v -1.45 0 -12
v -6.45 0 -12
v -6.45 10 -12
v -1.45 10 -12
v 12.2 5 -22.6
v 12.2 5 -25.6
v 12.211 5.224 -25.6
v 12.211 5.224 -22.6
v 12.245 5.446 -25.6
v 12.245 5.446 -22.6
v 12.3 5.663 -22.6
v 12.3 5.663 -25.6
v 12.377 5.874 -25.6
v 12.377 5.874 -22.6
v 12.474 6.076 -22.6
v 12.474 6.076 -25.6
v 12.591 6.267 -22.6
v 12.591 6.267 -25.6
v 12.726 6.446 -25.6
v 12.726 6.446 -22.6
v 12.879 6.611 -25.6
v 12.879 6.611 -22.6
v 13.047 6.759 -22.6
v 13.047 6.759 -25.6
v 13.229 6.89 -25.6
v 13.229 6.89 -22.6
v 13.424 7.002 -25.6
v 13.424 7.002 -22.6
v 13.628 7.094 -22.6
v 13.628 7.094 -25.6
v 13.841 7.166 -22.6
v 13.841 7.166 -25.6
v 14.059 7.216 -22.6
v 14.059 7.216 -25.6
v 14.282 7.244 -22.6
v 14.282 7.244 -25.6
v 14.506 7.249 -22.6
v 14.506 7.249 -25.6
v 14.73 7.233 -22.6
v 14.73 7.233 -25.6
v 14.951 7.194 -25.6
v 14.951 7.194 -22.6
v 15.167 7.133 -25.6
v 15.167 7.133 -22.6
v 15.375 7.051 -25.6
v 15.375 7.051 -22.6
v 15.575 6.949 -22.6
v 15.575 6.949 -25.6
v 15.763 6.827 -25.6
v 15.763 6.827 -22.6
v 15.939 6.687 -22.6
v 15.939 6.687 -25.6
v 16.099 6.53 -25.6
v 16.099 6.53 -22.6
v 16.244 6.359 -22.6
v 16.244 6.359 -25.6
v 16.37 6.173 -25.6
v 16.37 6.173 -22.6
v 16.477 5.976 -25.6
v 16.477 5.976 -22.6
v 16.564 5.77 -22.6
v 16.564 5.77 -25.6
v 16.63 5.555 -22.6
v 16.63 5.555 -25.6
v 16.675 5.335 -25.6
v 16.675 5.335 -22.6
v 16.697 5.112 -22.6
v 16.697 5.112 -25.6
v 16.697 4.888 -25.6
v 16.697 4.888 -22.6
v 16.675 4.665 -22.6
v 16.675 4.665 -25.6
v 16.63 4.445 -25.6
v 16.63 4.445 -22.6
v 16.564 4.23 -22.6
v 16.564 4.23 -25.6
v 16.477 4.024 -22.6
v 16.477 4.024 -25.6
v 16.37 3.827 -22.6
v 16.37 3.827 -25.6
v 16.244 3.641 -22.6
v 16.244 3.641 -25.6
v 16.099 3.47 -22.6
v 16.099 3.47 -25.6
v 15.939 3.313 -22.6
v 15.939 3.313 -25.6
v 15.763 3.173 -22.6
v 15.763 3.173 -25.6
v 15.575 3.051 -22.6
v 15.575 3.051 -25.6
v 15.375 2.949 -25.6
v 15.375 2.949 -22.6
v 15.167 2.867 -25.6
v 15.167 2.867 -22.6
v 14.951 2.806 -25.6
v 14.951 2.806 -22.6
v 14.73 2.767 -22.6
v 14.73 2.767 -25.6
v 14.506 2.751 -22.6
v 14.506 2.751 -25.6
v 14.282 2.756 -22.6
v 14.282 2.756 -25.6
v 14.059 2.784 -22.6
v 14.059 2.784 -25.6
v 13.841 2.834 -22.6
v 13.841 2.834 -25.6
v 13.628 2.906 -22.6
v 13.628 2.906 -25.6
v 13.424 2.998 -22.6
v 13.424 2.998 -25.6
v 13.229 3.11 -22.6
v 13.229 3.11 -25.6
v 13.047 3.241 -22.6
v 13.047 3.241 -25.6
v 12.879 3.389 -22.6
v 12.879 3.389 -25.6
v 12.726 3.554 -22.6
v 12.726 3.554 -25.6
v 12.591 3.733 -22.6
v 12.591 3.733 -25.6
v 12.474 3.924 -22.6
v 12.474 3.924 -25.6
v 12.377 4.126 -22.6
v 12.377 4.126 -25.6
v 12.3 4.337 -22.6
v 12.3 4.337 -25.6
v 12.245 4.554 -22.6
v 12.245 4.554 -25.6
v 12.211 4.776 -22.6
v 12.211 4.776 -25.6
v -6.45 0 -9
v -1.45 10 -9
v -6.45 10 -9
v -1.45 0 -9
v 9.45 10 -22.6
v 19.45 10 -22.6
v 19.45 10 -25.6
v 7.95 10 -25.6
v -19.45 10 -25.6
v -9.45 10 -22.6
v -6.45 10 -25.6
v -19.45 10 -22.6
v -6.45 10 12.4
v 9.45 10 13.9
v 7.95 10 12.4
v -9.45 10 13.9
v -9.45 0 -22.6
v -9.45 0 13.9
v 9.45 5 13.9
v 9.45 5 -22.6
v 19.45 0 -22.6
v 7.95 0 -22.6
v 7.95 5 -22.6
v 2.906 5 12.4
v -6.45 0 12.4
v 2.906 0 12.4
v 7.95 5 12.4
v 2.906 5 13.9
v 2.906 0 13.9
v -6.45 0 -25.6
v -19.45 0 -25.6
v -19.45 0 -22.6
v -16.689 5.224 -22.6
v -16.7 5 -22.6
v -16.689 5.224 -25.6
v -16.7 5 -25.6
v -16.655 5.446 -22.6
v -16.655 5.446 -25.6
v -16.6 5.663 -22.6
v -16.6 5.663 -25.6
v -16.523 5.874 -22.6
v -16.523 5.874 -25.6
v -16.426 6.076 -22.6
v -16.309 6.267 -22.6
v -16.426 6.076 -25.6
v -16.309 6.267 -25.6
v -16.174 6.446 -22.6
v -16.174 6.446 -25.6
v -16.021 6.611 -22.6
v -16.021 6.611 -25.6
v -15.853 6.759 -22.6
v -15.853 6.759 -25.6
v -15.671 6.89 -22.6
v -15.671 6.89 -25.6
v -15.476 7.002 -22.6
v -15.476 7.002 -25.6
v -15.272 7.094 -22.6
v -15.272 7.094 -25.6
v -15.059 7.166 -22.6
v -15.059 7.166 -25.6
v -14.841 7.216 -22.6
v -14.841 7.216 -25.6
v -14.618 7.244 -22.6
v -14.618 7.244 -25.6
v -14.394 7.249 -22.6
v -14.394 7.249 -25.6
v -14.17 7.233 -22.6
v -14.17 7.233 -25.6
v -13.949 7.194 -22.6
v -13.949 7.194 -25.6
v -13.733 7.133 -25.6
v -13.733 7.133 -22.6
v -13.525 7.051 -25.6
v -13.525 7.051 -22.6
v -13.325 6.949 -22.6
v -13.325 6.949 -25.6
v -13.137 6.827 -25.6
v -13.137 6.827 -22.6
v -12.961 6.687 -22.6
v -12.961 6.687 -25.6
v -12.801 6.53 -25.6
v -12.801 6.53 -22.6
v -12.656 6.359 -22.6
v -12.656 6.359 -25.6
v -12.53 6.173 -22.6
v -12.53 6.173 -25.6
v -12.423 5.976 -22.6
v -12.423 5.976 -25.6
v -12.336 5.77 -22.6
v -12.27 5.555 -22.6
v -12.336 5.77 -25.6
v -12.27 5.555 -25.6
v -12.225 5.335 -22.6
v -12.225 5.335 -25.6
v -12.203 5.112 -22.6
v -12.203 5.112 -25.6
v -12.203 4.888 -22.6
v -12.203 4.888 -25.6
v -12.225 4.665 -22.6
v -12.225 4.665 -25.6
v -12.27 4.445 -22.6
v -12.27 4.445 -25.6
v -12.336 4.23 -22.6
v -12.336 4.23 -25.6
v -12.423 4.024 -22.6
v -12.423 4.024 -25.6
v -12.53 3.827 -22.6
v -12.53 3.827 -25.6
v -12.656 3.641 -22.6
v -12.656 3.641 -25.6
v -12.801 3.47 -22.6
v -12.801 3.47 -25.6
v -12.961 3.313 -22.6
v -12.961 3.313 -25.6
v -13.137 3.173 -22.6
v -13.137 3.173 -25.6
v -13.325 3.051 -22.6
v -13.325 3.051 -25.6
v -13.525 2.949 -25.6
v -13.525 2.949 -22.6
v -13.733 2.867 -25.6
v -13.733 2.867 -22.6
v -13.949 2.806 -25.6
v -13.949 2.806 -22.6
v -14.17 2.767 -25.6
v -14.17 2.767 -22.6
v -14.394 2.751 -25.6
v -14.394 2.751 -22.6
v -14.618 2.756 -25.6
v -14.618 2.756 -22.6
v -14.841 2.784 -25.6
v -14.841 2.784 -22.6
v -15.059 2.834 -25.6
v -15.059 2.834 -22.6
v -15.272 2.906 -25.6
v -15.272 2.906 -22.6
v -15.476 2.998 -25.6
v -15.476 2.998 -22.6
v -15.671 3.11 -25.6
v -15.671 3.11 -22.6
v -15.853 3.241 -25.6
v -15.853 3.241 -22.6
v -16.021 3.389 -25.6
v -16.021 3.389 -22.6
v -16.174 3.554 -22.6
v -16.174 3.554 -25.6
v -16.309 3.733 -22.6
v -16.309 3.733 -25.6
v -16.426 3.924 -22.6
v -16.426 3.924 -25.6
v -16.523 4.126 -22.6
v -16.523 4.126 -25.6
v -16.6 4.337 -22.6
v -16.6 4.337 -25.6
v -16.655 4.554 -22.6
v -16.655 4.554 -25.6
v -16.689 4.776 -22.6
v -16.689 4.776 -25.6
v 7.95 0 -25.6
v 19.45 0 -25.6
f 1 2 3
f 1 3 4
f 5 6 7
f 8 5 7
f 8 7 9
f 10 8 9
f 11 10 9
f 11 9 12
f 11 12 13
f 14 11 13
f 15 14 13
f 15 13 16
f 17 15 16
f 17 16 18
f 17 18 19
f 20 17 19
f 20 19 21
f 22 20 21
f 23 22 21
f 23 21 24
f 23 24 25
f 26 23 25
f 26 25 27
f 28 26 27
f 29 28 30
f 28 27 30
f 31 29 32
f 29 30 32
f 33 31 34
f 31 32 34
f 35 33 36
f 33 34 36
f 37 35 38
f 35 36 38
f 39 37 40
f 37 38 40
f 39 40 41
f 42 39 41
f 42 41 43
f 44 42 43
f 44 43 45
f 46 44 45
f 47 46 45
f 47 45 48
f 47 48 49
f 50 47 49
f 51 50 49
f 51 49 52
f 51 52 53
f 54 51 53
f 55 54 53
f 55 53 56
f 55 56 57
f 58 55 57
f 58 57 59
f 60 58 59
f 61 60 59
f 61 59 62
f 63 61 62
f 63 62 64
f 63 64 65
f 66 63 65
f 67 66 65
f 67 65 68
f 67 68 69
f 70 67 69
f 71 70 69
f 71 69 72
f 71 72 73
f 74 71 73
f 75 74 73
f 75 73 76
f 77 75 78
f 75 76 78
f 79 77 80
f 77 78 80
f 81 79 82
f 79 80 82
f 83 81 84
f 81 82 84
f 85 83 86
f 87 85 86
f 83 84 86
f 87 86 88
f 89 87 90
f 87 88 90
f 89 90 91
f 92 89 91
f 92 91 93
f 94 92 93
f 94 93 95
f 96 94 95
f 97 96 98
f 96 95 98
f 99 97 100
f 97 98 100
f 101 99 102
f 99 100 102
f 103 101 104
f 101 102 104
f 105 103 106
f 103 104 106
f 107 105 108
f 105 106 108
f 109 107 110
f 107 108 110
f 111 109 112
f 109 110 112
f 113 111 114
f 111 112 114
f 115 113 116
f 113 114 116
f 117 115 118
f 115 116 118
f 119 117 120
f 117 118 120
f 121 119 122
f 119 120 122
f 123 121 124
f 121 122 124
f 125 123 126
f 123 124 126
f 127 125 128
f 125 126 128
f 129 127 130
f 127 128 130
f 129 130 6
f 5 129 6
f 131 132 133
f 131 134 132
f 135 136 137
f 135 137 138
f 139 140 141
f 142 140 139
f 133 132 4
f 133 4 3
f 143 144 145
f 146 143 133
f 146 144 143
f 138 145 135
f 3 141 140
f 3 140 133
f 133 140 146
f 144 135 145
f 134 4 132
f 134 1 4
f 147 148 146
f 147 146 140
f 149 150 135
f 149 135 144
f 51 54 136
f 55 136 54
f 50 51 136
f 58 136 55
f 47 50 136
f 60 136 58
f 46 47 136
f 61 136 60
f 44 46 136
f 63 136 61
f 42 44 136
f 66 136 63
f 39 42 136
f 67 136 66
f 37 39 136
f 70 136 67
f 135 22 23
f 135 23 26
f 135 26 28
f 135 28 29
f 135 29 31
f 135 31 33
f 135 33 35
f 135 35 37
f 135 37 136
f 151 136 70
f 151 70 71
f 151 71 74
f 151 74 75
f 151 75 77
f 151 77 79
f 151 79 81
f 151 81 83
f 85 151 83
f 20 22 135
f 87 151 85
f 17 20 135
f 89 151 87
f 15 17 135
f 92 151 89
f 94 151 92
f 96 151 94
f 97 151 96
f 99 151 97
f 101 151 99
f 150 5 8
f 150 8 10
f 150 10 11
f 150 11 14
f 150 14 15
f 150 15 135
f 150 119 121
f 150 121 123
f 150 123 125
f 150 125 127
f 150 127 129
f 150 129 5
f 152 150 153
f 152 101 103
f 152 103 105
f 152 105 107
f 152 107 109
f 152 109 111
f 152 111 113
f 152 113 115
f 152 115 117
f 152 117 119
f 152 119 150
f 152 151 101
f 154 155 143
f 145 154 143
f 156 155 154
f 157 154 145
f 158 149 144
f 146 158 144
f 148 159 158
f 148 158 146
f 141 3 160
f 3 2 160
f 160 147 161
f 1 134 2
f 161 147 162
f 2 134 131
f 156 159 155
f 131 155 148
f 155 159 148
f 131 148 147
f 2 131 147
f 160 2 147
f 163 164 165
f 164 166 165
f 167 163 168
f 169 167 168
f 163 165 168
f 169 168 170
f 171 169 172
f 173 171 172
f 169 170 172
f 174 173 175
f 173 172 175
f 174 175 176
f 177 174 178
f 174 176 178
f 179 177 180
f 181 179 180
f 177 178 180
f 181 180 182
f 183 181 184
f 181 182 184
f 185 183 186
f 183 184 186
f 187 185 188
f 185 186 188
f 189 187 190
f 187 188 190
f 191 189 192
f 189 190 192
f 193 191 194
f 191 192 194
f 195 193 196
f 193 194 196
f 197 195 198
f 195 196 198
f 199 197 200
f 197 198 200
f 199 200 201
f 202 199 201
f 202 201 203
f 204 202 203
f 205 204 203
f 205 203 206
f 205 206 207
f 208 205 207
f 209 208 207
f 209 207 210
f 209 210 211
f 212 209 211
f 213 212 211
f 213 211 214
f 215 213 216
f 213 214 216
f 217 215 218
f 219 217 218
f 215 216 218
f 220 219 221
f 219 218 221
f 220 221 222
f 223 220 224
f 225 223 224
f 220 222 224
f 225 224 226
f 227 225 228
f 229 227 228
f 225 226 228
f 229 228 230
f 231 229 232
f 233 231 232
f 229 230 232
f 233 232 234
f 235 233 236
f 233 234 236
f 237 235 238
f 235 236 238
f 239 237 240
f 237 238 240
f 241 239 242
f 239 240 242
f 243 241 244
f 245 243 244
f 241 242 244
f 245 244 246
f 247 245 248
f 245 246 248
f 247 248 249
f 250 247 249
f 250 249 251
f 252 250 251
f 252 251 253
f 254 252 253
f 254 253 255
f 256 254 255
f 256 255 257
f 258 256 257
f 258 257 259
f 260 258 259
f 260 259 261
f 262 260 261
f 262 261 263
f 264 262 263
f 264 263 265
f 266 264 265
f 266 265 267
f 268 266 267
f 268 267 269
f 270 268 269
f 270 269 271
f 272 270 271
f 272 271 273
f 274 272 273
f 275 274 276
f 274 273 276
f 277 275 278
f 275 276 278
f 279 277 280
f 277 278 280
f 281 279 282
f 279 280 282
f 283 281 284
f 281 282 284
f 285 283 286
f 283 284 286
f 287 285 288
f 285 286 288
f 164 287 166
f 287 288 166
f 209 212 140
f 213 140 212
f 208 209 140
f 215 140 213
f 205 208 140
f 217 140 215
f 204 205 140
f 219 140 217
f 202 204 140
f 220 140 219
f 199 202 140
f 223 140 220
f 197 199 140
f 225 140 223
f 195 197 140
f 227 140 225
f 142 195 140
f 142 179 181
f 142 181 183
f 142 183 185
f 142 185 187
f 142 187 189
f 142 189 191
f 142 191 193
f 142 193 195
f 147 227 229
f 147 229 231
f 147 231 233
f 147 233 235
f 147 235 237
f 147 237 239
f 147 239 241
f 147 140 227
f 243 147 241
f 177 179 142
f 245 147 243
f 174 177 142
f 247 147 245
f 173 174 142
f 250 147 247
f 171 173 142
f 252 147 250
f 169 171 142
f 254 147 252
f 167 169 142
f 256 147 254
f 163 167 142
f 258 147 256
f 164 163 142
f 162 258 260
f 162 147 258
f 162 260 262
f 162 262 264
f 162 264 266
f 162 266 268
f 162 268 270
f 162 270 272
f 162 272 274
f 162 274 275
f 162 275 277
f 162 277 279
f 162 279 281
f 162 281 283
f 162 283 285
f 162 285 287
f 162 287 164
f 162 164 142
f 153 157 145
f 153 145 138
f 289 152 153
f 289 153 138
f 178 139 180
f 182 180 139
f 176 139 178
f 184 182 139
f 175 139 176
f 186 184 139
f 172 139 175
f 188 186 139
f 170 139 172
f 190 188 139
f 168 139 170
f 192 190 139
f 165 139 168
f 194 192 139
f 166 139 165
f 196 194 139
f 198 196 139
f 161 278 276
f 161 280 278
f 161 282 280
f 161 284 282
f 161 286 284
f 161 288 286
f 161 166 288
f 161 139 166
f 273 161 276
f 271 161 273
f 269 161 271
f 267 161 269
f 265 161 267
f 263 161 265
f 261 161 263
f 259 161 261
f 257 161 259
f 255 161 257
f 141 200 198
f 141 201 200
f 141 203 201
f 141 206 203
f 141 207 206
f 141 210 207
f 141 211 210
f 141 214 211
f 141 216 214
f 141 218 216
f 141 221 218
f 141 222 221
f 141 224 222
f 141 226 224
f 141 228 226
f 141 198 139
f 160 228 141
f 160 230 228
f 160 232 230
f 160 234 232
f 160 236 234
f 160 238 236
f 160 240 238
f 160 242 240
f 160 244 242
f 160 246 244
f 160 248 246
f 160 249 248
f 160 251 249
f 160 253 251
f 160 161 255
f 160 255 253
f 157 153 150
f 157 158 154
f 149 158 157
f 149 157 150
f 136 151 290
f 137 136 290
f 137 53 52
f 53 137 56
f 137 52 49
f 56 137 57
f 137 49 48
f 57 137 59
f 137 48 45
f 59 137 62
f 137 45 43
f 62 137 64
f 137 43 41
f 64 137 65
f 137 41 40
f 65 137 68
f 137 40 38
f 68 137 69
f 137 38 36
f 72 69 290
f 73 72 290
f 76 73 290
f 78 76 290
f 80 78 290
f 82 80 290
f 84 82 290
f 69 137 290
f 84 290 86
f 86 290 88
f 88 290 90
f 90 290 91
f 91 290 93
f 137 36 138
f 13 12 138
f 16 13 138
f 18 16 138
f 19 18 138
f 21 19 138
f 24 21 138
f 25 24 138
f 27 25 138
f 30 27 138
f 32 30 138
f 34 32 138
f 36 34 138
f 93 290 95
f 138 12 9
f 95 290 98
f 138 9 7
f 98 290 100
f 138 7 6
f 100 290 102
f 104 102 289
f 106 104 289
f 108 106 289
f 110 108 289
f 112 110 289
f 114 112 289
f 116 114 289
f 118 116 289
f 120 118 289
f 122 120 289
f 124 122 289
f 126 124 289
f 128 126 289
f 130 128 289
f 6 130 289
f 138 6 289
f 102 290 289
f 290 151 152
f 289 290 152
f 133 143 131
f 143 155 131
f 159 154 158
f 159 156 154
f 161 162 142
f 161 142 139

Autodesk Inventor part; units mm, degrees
ref_plane "YZ Plane" through (0, 0, 0) normal (1, 0, 0) x (0, 1, 0)
ref_plane "XZ Plane" through (0, 0, 0) normal (0, 1, 0) x (-1, 0, 0)
ref_plane "XY Plane" through (0, 0, 0) normal (0, 0, 1) x (1, 0, 0)
sketch "Sketch1" plane through (0, 0, 0) normal (0, 1, 0) x (-1, 0, 0)
  line L0 (-9.45, 13.9) -> (9.45, 13.9)
  line L1 (9.45, 13.9) -> (9.45, 12.4)
  line L2 (9.45, 12.4) -> (-9.45, 12.4)
  line L3 (-9.45, 12.4) -> (-9.45, 13.9)
  line L4 (9.45, 12.4) -> (6.45, 12.4)
  line L5 (6.45, 12.4) -> (6.45, -9)
  line L6 (6.45, -9) -> (9.45, -9)
  line L7 (9.45, -9) -> (9.45, 12.4)
  line L8 (-9.45, 12.4) -> (-7.95, 12.4)
  line L9 (-7.95, 12.4) -> (-7.95, -9)
  line L10 (-7.95, -9) -> (-9.45, -9)
  line L11 (-9.45, -9) -> (-9.45, 12.4)
  line L12 (-7.95, -7.6) -> (-9.45, -7.6)
  line L13 (-9.45, -7.6) -> (-9.45, -10.6)
  line L14 (-9.45, -10.6) -> (-7.95, -10.6)
  line L15 (-7.95, -10.6) -> (-7.95, -7.6)
  line L16 (1.45, -9) -> (9.45, -9)
  line L17 (9.45, -9) -> (9.45, -12)
  line L18 (9.45, -12) -> (1.45, -12)
  line L19 (1.45, -12) -> (1.45, -9)
  line L20 (-9.45, -10.6) -> (-7.95, -10.6)
  line L21 (-7.95, -10.6) -> (-7.95, -22.6)
  line L22 (-7.95, -22.6) -> (-9.45, -22.6)
  line L23 (-9.45, -22.6) -> (-9.45, -10.6)
  line L24 (9.45, -12) -> (6.45, -12)
  line L25 (6.45, -12) -> (6.45, -22.6)
  line L26 (6.45, -22.6) -> (9.45, -22.6)
  line L27 (9.45, -22.6) -> (9.45, -12)
  line L28 (-7.95, -22.6) -> (-19.45, -22.6)
  line L29 (-19.45, -22.6) -> (-19.45, -25.6)
  line L30 (-19.45, -25.6) -> (-7.95, -25.6)
  line L31 (-7.95, -25.6) -> (-7.95, -22.6)
  line L32 (6.45, -22.6) -> (19.45, -22.6)
  line L33 (19.45, -22.6) -> (19.45, -25.6)
  line L34 (19.45, -25.6) -> (6.45, -25.6)
  line L35 (6.45, -25.6) -> (6.45, -22.6)
  line L36 (-14.45, -26) -> (-14.45, -42) construction
  line L37 (14.45, -27) -> (14.45, -42) construction
  point P0 (0, 0)
  point P1 (0, 12.4)
  dimension "d0" = 1.5
  dimension "d1" = 3
  dimension "d2" = 1.5
  dimension "d3" = 3
  dimension "d4" = 3
  dimension "d5" = 0
  dimension "d6" = 5
  dimension "d7" = 14.4
  dimension "d8" = 21.4
  dimension "d9" = 20
  dimension "d12" = 0
  dimension "d13" = 0
  dimension "d20" = 12
  dimension "d21" = 10
  dimension "d22" = 1.5
  dimension "d23" = 3
  dimension "d24" = 10
  dimension "d25" = 3
  dimension "d26" = 3
  dimension "d33" = 5
  dimension "d34" = 5
  dimension "d35" = 28.9
extrude "Extrusion1" add sketch "Sketch1" along normal blind 10
sketch "Sketch6" plane through (19.45, 0, -25.6) normal (0, 0, -1) x (-1, 0, 0)
  line L0 (0, 10) -> (11.5, 10) projected
  line L1 (0, 0) -> (10, 0)
  line L2 (10, 0) -> (10, 10)
  line L3 (10, 10) -> (0, 10)
  line L4 (0, 10) -> (0, 0)
  circle A0 centre (5, 5) radius 2.25
  point P0 (19.45, 0)
  dimension "d27" = 4.5
sketch "Sketch7" plane through (-6.45, 0, -25.6) normal (0, 0, -1) x (-1, 0, 0)
  line L0 (0, 10) -> (13, 10) projected
  line L1 (13, 0) -> (3, 0)
  line L2 (3, 0) -> (3, 10)
  line L3 (3, 10) -> (13, 10)
  line L4 (13, 10) -> (13, 0)
  circle A0 centre (8, 5) radius 2.25
  point P0 (-6.45, 0)
  dimension "d28" = 4.5
extrude "Extrusion4" cut sketch "Sketch6" against normal blind 4 contours A0
extrude "Extrusion5" cut sketch "Sketch7" against normal blind 4 contours A0
sketch "Sketch8" plane through (0, 0, 0) normal (0, -1, 0) x (1, 0, 0)
  line L0 (2.9056, 13.9) -> (14.45, 13.9)
  line L1 (14.45, 13.9) -> (14.45, -22.6)
  line L2 (14.45, -22.6) -> (2.9056, -22.6)
  line L3 (2.9056, -22.6) -> (2.9056, 13.9)
  line L4 (9.45, -22.6) -> (19.45, -22.6) projected
  line L5 (-9.45, 13.9) -> (9.45, 13.9) projected
  point P0 (0, 0)
extrude "Extrusion6" cut sketch "Sketch8" against normal blind 5
equation "\"sp\" = 0.4"
properties part number "MotorMount"
